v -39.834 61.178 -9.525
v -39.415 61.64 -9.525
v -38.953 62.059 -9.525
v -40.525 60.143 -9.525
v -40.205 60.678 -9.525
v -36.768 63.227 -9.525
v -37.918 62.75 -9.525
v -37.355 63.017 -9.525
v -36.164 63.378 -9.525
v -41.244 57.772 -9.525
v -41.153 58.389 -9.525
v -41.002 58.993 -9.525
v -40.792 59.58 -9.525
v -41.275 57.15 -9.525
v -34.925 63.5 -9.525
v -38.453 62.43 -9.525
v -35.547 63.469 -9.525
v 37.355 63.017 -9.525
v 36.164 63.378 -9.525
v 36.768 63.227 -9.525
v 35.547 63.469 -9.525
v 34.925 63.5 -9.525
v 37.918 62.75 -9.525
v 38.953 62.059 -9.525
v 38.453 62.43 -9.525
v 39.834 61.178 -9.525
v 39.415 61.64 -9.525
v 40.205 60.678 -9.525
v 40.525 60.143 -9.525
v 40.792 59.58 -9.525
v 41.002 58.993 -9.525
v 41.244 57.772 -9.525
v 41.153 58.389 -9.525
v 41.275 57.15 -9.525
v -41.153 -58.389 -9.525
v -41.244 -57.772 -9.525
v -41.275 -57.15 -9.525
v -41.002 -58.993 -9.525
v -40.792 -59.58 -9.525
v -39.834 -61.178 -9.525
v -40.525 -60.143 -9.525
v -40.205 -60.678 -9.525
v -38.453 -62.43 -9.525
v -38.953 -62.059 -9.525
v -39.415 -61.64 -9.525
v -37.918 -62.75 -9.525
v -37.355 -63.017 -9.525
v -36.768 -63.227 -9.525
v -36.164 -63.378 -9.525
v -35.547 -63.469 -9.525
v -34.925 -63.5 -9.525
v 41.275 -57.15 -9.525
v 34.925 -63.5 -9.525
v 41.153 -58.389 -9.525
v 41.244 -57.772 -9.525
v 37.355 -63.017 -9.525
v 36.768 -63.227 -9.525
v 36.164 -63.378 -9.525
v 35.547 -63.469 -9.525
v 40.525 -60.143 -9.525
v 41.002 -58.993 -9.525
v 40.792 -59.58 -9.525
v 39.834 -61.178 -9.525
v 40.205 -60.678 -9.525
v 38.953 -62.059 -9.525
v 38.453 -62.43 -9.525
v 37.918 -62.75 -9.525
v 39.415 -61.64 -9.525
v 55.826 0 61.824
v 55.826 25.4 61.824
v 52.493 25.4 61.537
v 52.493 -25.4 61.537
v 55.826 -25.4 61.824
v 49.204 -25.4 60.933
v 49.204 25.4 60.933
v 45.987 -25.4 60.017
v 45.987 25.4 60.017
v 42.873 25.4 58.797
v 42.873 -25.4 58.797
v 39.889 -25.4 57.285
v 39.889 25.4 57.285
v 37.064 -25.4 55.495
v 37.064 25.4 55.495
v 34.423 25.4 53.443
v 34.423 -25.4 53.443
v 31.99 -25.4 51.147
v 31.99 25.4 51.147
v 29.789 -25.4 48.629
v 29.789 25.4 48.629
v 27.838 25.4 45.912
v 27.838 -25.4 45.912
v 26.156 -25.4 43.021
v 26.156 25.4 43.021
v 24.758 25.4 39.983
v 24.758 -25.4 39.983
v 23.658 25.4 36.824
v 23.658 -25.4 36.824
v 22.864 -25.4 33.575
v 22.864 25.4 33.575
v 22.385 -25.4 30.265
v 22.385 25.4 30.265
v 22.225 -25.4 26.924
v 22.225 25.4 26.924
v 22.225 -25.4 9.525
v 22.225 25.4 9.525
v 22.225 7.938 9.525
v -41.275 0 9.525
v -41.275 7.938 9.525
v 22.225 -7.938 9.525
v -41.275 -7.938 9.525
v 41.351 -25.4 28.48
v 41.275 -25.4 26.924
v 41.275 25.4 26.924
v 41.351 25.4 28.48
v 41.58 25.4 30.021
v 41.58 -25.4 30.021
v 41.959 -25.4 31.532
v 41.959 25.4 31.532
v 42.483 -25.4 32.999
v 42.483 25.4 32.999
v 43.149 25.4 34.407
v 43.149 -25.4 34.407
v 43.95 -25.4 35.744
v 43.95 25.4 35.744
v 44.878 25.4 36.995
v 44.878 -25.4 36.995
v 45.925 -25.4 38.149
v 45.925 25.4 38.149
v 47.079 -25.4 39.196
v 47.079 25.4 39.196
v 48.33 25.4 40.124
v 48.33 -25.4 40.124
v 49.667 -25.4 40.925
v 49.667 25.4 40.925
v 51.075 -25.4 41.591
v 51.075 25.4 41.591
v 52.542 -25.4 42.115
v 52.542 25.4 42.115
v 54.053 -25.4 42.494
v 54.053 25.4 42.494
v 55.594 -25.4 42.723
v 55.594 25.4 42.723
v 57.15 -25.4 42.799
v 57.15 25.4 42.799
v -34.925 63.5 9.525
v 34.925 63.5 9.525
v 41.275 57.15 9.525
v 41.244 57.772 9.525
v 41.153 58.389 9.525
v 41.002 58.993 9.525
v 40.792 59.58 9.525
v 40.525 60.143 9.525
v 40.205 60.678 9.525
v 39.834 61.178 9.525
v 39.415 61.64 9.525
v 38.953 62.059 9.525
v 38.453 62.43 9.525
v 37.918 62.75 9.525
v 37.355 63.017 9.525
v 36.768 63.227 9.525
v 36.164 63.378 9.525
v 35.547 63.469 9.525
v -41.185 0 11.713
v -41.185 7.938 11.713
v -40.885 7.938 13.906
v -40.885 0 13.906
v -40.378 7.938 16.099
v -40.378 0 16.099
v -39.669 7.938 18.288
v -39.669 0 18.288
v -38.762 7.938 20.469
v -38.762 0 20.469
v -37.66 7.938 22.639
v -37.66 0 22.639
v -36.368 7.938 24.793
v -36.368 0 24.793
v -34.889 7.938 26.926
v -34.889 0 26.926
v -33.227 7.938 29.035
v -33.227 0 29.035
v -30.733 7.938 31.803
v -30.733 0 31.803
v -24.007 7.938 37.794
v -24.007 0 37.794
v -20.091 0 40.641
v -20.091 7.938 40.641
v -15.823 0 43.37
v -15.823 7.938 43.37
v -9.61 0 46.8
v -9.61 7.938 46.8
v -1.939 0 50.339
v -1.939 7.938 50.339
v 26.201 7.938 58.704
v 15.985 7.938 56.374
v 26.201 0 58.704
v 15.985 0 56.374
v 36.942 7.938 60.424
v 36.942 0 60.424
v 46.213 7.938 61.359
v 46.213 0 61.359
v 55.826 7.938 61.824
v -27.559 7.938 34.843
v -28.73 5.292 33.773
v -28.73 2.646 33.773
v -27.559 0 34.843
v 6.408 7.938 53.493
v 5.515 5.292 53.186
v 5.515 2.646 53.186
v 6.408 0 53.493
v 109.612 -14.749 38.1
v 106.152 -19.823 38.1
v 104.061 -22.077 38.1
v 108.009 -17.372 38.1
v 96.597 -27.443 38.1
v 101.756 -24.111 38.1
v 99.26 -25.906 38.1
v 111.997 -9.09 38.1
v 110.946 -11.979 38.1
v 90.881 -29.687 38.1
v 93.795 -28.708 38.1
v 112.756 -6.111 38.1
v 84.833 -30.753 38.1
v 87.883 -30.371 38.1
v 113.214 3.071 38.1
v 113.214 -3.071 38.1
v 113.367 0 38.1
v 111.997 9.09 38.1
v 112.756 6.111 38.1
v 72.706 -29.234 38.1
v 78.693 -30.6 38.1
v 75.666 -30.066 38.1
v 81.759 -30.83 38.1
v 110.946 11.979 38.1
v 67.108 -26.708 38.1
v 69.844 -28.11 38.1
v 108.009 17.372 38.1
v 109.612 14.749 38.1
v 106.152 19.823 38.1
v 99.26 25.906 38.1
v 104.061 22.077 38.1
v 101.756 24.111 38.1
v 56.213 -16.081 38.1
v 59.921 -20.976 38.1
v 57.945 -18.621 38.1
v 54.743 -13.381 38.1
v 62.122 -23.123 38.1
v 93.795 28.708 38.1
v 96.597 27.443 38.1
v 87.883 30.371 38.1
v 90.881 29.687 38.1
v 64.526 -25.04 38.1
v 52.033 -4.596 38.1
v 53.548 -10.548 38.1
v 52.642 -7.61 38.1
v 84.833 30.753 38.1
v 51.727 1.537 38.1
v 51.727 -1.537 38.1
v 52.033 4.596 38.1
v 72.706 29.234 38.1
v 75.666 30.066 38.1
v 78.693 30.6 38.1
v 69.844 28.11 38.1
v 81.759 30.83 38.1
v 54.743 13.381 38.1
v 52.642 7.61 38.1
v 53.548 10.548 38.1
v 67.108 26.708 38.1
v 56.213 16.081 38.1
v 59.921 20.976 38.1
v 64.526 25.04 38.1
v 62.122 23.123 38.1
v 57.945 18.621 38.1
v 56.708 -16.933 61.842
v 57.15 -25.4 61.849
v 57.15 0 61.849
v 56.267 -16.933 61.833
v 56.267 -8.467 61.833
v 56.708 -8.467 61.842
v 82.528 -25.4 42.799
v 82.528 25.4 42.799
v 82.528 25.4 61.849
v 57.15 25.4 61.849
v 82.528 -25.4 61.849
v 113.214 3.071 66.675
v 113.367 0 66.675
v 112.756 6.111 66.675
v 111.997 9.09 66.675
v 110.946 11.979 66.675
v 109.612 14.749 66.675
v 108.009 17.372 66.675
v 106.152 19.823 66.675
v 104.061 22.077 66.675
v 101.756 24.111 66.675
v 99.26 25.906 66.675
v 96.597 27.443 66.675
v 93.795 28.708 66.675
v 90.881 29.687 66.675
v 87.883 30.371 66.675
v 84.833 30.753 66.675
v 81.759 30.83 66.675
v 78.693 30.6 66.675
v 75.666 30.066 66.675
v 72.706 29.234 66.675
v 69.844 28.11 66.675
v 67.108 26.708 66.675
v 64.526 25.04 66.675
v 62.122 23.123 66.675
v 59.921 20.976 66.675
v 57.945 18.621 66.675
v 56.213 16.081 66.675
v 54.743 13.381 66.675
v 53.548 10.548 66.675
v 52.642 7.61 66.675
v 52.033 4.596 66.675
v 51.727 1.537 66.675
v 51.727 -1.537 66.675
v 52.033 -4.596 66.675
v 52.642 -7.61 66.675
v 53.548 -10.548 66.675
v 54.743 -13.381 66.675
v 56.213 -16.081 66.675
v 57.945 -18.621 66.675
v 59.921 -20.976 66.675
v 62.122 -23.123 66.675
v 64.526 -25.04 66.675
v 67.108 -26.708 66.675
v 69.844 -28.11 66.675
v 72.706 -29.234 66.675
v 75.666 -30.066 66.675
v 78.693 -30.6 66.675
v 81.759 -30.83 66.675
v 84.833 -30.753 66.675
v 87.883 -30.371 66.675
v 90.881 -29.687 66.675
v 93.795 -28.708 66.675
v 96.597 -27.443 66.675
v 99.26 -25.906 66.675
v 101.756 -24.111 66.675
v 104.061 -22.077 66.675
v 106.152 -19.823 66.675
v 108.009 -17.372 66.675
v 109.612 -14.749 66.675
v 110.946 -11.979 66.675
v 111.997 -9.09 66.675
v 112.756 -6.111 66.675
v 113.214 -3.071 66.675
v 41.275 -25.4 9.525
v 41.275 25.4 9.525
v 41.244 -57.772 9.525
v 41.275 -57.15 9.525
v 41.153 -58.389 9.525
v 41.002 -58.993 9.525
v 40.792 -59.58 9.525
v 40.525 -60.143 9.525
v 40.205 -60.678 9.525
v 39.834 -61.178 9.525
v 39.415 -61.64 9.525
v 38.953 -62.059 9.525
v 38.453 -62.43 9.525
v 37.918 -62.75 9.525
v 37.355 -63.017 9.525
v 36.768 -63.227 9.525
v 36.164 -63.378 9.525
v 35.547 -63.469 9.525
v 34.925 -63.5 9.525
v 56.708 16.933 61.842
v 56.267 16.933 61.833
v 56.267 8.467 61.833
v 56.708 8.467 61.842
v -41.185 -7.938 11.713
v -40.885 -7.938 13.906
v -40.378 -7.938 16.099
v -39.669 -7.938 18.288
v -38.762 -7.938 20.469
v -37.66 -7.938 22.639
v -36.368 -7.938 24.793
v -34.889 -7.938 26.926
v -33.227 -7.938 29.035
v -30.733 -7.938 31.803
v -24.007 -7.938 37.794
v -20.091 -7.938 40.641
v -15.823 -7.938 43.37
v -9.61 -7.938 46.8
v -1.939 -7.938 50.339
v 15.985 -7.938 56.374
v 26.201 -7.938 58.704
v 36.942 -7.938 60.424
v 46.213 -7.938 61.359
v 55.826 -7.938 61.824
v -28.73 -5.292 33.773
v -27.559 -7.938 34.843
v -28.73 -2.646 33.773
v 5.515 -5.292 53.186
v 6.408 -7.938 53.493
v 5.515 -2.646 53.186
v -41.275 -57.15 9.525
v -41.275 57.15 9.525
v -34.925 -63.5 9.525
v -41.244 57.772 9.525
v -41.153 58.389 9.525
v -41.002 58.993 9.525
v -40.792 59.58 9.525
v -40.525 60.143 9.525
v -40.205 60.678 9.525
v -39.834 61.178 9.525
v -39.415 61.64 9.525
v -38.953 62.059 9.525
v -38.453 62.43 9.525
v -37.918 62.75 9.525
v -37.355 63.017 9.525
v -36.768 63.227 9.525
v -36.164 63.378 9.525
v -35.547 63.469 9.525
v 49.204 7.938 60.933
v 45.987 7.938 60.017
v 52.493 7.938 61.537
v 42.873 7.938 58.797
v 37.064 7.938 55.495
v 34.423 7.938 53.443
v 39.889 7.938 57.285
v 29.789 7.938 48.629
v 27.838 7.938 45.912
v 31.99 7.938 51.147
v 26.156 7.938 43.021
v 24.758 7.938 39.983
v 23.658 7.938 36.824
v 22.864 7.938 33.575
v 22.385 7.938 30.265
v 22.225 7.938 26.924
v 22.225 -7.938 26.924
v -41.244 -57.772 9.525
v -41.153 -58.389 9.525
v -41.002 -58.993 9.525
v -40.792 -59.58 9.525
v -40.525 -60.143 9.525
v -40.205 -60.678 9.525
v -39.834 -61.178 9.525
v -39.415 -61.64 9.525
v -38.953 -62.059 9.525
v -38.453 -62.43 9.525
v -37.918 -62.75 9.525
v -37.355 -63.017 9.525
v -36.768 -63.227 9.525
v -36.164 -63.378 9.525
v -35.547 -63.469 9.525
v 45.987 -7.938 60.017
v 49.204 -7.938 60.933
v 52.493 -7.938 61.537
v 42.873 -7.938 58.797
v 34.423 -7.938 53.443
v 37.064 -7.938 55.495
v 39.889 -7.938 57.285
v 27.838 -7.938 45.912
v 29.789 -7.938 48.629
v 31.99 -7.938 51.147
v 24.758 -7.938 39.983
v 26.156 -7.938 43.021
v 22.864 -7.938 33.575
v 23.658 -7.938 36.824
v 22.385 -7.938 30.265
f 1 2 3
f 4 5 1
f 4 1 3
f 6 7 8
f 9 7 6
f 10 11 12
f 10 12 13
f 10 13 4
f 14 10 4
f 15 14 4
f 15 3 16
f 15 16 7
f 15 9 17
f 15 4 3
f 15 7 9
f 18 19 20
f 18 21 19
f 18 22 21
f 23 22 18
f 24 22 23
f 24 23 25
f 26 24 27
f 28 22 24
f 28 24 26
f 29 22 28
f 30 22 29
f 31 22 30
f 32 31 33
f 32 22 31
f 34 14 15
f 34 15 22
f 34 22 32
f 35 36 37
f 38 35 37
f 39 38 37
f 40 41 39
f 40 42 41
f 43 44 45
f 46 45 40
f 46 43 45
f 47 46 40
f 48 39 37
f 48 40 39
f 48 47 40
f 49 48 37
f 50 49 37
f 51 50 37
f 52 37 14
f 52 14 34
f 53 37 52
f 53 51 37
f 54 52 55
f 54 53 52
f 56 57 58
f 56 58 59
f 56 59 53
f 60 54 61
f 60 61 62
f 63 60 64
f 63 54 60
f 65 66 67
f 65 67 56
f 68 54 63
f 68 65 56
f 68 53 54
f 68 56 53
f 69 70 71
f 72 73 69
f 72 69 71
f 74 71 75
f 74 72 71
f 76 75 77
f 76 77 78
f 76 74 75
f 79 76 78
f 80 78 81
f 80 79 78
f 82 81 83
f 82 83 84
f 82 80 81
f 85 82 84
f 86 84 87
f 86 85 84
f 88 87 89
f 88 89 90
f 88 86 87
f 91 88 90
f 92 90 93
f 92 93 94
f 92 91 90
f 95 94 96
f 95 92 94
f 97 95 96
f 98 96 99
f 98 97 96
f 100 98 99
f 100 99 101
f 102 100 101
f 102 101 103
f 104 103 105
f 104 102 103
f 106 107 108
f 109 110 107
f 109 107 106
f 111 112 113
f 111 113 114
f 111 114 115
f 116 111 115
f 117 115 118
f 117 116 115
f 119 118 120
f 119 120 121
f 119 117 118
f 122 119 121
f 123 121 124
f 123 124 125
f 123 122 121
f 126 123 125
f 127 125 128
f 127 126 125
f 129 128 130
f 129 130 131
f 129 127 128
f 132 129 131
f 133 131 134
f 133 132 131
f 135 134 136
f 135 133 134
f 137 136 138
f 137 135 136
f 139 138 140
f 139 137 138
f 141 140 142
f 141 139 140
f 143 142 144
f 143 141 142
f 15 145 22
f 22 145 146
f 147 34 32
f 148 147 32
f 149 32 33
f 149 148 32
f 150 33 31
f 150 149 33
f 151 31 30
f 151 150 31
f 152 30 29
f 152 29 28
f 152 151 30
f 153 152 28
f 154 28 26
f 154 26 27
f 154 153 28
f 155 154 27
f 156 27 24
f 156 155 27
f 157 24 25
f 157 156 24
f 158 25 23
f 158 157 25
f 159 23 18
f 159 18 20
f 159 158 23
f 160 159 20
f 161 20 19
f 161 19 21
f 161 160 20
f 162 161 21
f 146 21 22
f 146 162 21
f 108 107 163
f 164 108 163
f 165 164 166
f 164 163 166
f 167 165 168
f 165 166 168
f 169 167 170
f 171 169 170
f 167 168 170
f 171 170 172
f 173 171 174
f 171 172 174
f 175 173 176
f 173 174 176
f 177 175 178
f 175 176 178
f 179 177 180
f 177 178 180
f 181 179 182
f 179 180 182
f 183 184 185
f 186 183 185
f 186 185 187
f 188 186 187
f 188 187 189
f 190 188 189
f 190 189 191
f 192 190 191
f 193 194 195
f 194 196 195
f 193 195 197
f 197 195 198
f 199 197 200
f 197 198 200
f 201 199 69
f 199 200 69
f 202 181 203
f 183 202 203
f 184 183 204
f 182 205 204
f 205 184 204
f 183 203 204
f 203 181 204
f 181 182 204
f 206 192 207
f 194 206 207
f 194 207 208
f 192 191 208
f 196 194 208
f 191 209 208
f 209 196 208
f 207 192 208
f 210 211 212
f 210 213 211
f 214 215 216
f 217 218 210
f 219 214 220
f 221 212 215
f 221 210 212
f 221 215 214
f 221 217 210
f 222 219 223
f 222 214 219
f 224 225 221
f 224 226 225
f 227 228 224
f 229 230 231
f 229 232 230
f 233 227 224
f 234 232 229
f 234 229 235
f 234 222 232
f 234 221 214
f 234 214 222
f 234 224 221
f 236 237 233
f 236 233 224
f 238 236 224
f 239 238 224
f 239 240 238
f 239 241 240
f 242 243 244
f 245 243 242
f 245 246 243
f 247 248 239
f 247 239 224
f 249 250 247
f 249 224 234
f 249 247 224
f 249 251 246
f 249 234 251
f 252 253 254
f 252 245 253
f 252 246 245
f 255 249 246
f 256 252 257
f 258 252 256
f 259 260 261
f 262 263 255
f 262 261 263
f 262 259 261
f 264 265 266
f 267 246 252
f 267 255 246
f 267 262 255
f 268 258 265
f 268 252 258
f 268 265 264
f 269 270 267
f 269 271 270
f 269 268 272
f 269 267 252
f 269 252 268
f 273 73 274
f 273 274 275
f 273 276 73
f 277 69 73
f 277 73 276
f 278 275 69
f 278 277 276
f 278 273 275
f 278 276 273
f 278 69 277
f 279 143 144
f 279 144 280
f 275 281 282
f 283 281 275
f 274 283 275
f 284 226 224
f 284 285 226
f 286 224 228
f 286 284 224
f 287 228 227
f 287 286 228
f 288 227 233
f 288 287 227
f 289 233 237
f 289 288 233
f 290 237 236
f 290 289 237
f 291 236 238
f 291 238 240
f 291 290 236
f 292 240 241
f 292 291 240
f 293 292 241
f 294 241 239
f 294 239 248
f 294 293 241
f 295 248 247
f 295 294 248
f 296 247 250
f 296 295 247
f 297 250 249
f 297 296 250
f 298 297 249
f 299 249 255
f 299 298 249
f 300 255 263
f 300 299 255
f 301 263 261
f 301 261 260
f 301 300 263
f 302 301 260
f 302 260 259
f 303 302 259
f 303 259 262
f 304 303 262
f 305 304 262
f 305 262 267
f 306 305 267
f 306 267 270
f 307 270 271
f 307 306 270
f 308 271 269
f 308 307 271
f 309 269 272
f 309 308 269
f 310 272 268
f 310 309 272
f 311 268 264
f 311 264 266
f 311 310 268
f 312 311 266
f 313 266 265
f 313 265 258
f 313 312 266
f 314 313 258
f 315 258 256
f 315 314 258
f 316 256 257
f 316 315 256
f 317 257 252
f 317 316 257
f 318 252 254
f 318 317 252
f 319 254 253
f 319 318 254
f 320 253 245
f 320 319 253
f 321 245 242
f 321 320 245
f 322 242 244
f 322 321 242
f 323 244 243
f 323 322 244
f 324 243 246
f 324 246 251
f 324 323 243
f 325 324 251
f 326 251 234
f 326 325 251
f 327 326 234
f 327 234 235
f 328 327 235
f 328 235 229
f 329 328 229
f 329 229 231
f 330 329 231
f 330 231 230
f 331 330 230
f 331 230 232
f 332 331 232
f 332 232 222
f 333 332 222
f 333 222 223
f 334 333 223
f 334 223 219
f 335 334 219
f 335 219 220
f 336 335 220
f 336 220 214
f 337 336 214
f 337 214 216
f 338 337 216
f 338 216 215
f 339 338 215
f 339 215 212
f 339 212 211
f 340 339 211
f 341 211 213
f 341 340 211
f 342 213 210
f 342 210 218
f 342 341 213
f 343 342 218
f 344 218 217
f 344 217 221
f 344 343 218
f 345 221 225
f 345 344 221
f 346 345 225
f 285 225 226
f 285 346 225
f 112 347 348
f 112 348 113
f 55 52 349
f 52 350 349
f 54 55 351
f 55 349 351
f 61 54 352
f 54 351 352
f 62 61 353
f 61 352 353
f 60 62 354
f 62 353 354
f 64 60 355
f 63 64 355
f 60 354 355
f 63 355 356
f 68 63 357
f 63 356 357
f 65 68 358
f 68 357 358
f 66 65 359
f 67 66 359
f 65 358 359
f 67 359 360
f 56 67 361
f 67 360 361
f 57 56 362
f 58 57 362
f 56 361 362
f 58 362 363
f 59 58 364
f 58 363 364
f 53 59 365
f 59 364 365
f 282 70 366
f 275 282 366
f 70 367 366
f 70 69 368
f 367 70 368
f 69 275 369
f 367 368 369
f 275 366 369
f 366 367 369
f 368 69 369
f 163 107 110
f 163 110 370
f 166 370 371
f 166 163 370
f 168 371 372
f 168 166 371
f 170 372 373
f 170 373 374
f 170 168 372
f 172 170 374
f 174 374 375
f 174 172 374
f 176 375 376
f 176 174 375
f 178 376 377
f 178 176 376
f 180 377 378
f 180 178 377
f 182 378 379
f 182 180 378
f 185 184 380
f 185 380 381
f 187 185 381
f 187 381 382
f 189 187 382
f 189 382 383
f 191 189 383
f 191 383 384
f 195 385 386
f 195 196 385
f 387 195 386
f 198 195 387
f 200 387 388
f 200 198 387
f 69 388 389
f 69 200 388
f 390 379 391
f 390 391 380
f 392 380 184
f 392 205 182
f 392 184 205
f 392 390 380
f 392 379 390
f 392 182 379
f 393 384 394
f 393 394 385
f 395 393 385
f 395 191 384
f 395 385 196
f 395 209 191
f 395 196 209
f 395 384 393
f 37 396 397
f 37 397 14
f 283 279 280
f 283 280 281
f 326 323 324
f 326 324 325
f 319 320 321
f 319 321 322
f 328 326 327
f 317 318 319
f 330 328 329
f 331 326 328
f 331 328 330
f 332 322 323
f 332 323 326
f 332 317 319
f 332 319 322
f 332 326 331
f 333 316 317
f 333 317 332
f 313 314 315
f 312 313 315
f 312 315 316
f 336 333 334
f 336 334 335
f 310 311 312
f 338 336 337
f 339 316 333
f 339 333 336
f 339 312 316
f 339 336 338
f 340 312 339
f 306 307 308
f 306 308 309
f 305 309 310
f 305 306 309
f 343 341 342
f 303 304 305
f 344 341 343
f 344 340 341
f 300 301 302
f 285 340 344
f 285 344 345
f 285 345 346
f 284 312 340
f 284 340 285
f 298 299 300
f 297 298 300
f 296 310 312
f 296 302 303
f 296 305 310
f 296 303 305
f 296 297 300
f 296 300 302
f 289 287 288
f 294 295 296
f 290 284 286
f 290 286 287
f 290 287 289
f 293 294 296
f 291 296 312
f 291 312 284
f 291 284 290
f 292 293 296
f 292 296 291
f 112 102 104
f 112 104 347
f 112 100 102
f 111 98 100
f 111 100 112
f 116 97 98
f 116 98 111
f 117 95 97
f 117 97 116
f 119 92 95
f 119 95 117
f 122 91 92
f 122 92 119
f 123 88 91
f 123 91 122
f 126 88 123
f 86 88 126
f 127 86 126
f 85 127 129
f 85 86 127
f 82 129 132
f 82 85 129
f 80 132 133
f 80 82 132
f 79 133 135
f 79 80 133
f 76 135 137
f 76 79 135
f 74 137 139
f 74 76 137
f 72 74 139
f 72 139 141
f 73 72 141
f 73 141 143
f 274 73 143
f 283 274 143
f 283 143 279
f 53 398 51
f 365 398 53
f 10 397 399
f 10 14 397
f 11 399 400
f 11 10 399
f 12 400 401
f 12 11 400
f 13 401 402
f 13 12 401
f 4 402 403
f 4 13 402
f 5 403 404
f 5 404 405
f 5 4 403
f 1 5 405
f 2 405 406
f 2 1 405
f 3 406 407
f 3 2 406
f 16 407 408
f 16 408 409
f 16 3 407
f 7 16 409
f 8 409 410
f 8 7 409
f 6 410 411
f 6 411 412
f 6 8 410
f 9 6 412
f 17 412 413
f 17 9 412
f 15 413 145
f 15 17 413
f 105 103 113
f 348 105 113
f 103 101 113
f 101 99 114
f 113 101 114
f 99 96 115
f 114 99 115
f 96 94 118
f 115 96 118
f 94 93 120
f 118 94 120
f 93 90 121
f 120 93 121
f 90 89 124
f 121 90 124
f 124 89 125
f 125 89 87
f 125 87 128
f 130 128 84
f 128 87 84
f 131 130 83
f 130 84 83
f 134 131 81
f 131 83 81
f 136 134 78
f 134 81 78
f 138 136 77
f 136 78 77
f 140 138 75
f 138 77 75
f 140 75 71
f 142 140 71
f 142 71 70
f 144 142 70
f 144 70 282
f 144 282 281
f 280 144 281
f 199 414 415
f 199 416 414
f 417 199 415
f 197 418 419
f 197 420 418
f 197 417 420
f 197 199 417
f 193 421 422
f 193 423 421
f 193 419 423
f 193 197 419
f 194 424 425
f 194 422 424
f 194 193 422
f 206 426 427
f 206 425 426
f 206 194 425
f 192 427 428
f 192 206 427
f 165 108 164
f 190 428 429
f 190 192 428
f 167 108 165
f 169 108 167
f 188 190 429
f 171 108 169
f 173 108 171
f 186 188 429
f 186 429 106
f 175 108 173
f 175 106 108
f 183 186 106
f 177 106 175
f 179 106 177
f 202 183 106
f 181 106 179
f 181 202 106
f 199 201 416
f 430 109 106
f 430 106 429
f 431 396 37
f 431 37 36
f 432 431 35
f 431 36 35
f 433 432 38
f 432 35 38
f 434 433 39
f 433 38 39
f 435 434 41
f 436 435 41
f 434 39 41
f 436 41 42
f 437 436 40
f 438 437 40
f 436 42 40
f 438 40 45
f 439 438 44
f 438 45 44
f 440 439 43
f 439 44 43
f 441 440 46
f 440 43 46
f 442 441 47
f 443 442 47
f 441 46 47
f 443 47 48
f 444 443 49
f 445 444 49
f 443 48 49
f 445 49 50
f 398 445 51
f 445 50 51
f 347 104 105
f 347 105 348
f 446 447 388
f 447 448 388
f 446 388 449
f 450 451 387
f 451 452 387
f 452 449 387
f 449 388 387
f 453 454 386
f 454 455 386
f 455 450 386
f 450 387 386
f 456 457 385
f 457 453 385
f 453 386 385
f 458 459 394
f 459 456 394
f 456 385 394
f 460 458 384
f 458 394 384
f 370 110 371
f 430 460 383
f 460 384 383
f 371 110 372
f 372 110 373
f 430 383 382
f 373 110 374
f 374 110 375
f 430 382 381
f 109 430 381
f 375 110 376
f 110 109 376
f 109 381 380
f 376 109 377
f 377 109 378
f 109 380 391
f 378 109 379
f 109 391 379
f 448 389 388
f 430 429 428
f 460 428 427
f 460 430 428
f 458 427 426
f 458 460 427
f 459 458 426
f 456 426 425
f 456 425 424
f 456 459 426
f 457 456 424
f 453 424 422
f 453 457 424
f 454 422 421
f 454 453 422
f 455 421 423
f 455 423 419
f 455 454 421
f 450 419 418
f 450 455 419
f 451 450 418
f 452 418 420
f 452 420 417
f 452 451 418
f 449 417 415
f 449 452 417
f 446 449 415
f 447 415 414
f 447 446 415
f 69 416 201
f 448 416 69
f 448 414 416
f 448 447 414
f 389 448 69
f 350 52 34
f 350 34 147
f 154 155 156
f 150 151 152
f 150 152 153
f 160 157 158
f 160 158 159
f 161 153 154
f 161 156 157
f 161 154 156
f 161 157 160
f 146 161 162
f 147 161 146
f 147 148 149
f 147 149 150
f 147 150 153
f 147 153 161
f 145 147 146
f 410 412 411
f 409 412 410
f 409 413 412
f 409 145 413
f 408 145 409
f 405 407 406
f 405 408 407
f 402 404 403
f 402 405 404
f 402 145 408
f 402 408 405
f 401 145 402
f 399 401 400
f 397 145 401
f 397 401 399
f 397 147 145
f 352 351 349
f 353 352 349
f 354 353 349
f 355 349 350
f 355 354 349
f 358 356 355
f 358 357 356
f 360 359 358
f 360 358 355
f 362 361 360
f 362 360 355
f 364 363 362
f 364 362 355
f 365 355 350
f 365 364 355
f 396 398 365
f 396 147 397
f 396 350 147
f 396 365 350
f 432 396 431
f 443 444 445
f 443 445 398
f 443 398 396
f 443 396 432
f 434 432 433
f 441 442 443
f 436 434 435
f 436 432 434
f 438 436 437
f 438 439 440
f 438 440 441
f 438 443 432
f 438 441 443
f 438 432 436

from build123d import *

# Parameters (mm, degrees)
F1_DEPTH = 63.5
F0_W     = 19.9605273192
F0_H     = 19.05
F2_DEPTH = 25.4
F3_DEPTH = 7.9375
F5_R     = 6.35


with BuildPart() as f1:
    # F0 (on Front) → F1 (new body, symmetric)
    with BuildSketch(Plane.XZ):
        Polygon((22.225, 9.525), (-41.275, 9.525), (-41.275, -9.525), (41.275, -9.525), (41.275, 9.525), align=None)
    extrude(amount=F1_DEPTH, both=True)

    # F5
    f5_edges = [f1.edges().sort_by_distance(p)[0] for p in [
        (-41.275, -63.5, 0),
        (41.275, -63.5, 0),
        (41.275, 63.5, 0),
        (-41.275, 63.5, 0),
    ]]
    fillet(f5_edges, radius=F5_R)


with BuildPart() as f2:
    # F0 (on Front) → F2 (new body, symmetric)
    with BuildSketch(Plane.XZ):
        with BuildLine():
            Line((22.225, 26.924), (22.225, 9.525))
            Line((22.225, 9.525), (41.275, 9.525))
            Line((41.275, 9.525), (41.275, 26.924))
            ThreePointArc((41.275, 26.924), (45.9246798487, 38.1493201513), (57.15, 42.799))
            Line((57.15, 42.799), (62.5674536577, 42.799))
            Line((62.5674536577, 42.799), (62.5674536577, 61.849))
            Line((62.5674536577, 61.849), (57.15, 61.849))
            add(Edge.make_bspline(
                [(55.8258251955, 61.8238880526), (56.2662688919, 61.8337886809), (56.7076645053, 61.8421635599), (57.15, 61.849)],
                knots=[110.6059898285, 110.6059898285, 110.6059898285, 110.6059898285, 111.468747194, 111.468747194, 111.468747194, 111.468747194], degree=3))
            ThreePointArc((55.8258251955, 61.8238880526), (31.9904846028, 51.1470140564), (22.225, 26.924))
        make_face()
        with Locations((72.5477173173, 52.324)):
            Rectangle(F0_W, F0_H)
    extrude(amount=F2_DEPTH, both=True)


with BuildPart() as f3:
    # F0 (on Front) → F3 (new body, symmetric)
    with BuildSketch(Plane.XZ):
        with BuildLine():
            add(Edge.make_bspline(
                [(-41.275, 9.525), (-41.4593213512, 34.2090771104), (-0.6393096823, 60.5546218275), (55.8258251955, 61.8238880526)],
                knots=[0, 0, 0, 0, 110.6059898285, 110.6059898285, 110.6059898285, 110.6059898285], degree=3))
            Line((-41.275, 9.525), (22.225, 9.525))
            Line((22.225, 9.525), (22.225, 26.924))
            ThreePointArc((22.225, 26.924), (31.9904846028, 51.1470140564), (55.8258251955, 61.8238880526))
        make_face()
    extrude(amount=F3_DEPTH, both=True)


with BuildPart() as f4:
    # F0 (on Front) → F4 (revolve)
    with BuildSketch(Plane.XZ):
        Polygon((82.5279809769, 66.675), (82.5279809769, 61.849), (82.5279809769, 42.799), (82.5279809769, 38.1), (113.3674536577, 38.1), (113.3674536577, 66.675), align=None)
    revolve(axis=Axis((82.5279809769, 0, 52.3875), (0, 0, 1)))


solid = Compound([f1.part, f2.part, f3.part, f4.part])
